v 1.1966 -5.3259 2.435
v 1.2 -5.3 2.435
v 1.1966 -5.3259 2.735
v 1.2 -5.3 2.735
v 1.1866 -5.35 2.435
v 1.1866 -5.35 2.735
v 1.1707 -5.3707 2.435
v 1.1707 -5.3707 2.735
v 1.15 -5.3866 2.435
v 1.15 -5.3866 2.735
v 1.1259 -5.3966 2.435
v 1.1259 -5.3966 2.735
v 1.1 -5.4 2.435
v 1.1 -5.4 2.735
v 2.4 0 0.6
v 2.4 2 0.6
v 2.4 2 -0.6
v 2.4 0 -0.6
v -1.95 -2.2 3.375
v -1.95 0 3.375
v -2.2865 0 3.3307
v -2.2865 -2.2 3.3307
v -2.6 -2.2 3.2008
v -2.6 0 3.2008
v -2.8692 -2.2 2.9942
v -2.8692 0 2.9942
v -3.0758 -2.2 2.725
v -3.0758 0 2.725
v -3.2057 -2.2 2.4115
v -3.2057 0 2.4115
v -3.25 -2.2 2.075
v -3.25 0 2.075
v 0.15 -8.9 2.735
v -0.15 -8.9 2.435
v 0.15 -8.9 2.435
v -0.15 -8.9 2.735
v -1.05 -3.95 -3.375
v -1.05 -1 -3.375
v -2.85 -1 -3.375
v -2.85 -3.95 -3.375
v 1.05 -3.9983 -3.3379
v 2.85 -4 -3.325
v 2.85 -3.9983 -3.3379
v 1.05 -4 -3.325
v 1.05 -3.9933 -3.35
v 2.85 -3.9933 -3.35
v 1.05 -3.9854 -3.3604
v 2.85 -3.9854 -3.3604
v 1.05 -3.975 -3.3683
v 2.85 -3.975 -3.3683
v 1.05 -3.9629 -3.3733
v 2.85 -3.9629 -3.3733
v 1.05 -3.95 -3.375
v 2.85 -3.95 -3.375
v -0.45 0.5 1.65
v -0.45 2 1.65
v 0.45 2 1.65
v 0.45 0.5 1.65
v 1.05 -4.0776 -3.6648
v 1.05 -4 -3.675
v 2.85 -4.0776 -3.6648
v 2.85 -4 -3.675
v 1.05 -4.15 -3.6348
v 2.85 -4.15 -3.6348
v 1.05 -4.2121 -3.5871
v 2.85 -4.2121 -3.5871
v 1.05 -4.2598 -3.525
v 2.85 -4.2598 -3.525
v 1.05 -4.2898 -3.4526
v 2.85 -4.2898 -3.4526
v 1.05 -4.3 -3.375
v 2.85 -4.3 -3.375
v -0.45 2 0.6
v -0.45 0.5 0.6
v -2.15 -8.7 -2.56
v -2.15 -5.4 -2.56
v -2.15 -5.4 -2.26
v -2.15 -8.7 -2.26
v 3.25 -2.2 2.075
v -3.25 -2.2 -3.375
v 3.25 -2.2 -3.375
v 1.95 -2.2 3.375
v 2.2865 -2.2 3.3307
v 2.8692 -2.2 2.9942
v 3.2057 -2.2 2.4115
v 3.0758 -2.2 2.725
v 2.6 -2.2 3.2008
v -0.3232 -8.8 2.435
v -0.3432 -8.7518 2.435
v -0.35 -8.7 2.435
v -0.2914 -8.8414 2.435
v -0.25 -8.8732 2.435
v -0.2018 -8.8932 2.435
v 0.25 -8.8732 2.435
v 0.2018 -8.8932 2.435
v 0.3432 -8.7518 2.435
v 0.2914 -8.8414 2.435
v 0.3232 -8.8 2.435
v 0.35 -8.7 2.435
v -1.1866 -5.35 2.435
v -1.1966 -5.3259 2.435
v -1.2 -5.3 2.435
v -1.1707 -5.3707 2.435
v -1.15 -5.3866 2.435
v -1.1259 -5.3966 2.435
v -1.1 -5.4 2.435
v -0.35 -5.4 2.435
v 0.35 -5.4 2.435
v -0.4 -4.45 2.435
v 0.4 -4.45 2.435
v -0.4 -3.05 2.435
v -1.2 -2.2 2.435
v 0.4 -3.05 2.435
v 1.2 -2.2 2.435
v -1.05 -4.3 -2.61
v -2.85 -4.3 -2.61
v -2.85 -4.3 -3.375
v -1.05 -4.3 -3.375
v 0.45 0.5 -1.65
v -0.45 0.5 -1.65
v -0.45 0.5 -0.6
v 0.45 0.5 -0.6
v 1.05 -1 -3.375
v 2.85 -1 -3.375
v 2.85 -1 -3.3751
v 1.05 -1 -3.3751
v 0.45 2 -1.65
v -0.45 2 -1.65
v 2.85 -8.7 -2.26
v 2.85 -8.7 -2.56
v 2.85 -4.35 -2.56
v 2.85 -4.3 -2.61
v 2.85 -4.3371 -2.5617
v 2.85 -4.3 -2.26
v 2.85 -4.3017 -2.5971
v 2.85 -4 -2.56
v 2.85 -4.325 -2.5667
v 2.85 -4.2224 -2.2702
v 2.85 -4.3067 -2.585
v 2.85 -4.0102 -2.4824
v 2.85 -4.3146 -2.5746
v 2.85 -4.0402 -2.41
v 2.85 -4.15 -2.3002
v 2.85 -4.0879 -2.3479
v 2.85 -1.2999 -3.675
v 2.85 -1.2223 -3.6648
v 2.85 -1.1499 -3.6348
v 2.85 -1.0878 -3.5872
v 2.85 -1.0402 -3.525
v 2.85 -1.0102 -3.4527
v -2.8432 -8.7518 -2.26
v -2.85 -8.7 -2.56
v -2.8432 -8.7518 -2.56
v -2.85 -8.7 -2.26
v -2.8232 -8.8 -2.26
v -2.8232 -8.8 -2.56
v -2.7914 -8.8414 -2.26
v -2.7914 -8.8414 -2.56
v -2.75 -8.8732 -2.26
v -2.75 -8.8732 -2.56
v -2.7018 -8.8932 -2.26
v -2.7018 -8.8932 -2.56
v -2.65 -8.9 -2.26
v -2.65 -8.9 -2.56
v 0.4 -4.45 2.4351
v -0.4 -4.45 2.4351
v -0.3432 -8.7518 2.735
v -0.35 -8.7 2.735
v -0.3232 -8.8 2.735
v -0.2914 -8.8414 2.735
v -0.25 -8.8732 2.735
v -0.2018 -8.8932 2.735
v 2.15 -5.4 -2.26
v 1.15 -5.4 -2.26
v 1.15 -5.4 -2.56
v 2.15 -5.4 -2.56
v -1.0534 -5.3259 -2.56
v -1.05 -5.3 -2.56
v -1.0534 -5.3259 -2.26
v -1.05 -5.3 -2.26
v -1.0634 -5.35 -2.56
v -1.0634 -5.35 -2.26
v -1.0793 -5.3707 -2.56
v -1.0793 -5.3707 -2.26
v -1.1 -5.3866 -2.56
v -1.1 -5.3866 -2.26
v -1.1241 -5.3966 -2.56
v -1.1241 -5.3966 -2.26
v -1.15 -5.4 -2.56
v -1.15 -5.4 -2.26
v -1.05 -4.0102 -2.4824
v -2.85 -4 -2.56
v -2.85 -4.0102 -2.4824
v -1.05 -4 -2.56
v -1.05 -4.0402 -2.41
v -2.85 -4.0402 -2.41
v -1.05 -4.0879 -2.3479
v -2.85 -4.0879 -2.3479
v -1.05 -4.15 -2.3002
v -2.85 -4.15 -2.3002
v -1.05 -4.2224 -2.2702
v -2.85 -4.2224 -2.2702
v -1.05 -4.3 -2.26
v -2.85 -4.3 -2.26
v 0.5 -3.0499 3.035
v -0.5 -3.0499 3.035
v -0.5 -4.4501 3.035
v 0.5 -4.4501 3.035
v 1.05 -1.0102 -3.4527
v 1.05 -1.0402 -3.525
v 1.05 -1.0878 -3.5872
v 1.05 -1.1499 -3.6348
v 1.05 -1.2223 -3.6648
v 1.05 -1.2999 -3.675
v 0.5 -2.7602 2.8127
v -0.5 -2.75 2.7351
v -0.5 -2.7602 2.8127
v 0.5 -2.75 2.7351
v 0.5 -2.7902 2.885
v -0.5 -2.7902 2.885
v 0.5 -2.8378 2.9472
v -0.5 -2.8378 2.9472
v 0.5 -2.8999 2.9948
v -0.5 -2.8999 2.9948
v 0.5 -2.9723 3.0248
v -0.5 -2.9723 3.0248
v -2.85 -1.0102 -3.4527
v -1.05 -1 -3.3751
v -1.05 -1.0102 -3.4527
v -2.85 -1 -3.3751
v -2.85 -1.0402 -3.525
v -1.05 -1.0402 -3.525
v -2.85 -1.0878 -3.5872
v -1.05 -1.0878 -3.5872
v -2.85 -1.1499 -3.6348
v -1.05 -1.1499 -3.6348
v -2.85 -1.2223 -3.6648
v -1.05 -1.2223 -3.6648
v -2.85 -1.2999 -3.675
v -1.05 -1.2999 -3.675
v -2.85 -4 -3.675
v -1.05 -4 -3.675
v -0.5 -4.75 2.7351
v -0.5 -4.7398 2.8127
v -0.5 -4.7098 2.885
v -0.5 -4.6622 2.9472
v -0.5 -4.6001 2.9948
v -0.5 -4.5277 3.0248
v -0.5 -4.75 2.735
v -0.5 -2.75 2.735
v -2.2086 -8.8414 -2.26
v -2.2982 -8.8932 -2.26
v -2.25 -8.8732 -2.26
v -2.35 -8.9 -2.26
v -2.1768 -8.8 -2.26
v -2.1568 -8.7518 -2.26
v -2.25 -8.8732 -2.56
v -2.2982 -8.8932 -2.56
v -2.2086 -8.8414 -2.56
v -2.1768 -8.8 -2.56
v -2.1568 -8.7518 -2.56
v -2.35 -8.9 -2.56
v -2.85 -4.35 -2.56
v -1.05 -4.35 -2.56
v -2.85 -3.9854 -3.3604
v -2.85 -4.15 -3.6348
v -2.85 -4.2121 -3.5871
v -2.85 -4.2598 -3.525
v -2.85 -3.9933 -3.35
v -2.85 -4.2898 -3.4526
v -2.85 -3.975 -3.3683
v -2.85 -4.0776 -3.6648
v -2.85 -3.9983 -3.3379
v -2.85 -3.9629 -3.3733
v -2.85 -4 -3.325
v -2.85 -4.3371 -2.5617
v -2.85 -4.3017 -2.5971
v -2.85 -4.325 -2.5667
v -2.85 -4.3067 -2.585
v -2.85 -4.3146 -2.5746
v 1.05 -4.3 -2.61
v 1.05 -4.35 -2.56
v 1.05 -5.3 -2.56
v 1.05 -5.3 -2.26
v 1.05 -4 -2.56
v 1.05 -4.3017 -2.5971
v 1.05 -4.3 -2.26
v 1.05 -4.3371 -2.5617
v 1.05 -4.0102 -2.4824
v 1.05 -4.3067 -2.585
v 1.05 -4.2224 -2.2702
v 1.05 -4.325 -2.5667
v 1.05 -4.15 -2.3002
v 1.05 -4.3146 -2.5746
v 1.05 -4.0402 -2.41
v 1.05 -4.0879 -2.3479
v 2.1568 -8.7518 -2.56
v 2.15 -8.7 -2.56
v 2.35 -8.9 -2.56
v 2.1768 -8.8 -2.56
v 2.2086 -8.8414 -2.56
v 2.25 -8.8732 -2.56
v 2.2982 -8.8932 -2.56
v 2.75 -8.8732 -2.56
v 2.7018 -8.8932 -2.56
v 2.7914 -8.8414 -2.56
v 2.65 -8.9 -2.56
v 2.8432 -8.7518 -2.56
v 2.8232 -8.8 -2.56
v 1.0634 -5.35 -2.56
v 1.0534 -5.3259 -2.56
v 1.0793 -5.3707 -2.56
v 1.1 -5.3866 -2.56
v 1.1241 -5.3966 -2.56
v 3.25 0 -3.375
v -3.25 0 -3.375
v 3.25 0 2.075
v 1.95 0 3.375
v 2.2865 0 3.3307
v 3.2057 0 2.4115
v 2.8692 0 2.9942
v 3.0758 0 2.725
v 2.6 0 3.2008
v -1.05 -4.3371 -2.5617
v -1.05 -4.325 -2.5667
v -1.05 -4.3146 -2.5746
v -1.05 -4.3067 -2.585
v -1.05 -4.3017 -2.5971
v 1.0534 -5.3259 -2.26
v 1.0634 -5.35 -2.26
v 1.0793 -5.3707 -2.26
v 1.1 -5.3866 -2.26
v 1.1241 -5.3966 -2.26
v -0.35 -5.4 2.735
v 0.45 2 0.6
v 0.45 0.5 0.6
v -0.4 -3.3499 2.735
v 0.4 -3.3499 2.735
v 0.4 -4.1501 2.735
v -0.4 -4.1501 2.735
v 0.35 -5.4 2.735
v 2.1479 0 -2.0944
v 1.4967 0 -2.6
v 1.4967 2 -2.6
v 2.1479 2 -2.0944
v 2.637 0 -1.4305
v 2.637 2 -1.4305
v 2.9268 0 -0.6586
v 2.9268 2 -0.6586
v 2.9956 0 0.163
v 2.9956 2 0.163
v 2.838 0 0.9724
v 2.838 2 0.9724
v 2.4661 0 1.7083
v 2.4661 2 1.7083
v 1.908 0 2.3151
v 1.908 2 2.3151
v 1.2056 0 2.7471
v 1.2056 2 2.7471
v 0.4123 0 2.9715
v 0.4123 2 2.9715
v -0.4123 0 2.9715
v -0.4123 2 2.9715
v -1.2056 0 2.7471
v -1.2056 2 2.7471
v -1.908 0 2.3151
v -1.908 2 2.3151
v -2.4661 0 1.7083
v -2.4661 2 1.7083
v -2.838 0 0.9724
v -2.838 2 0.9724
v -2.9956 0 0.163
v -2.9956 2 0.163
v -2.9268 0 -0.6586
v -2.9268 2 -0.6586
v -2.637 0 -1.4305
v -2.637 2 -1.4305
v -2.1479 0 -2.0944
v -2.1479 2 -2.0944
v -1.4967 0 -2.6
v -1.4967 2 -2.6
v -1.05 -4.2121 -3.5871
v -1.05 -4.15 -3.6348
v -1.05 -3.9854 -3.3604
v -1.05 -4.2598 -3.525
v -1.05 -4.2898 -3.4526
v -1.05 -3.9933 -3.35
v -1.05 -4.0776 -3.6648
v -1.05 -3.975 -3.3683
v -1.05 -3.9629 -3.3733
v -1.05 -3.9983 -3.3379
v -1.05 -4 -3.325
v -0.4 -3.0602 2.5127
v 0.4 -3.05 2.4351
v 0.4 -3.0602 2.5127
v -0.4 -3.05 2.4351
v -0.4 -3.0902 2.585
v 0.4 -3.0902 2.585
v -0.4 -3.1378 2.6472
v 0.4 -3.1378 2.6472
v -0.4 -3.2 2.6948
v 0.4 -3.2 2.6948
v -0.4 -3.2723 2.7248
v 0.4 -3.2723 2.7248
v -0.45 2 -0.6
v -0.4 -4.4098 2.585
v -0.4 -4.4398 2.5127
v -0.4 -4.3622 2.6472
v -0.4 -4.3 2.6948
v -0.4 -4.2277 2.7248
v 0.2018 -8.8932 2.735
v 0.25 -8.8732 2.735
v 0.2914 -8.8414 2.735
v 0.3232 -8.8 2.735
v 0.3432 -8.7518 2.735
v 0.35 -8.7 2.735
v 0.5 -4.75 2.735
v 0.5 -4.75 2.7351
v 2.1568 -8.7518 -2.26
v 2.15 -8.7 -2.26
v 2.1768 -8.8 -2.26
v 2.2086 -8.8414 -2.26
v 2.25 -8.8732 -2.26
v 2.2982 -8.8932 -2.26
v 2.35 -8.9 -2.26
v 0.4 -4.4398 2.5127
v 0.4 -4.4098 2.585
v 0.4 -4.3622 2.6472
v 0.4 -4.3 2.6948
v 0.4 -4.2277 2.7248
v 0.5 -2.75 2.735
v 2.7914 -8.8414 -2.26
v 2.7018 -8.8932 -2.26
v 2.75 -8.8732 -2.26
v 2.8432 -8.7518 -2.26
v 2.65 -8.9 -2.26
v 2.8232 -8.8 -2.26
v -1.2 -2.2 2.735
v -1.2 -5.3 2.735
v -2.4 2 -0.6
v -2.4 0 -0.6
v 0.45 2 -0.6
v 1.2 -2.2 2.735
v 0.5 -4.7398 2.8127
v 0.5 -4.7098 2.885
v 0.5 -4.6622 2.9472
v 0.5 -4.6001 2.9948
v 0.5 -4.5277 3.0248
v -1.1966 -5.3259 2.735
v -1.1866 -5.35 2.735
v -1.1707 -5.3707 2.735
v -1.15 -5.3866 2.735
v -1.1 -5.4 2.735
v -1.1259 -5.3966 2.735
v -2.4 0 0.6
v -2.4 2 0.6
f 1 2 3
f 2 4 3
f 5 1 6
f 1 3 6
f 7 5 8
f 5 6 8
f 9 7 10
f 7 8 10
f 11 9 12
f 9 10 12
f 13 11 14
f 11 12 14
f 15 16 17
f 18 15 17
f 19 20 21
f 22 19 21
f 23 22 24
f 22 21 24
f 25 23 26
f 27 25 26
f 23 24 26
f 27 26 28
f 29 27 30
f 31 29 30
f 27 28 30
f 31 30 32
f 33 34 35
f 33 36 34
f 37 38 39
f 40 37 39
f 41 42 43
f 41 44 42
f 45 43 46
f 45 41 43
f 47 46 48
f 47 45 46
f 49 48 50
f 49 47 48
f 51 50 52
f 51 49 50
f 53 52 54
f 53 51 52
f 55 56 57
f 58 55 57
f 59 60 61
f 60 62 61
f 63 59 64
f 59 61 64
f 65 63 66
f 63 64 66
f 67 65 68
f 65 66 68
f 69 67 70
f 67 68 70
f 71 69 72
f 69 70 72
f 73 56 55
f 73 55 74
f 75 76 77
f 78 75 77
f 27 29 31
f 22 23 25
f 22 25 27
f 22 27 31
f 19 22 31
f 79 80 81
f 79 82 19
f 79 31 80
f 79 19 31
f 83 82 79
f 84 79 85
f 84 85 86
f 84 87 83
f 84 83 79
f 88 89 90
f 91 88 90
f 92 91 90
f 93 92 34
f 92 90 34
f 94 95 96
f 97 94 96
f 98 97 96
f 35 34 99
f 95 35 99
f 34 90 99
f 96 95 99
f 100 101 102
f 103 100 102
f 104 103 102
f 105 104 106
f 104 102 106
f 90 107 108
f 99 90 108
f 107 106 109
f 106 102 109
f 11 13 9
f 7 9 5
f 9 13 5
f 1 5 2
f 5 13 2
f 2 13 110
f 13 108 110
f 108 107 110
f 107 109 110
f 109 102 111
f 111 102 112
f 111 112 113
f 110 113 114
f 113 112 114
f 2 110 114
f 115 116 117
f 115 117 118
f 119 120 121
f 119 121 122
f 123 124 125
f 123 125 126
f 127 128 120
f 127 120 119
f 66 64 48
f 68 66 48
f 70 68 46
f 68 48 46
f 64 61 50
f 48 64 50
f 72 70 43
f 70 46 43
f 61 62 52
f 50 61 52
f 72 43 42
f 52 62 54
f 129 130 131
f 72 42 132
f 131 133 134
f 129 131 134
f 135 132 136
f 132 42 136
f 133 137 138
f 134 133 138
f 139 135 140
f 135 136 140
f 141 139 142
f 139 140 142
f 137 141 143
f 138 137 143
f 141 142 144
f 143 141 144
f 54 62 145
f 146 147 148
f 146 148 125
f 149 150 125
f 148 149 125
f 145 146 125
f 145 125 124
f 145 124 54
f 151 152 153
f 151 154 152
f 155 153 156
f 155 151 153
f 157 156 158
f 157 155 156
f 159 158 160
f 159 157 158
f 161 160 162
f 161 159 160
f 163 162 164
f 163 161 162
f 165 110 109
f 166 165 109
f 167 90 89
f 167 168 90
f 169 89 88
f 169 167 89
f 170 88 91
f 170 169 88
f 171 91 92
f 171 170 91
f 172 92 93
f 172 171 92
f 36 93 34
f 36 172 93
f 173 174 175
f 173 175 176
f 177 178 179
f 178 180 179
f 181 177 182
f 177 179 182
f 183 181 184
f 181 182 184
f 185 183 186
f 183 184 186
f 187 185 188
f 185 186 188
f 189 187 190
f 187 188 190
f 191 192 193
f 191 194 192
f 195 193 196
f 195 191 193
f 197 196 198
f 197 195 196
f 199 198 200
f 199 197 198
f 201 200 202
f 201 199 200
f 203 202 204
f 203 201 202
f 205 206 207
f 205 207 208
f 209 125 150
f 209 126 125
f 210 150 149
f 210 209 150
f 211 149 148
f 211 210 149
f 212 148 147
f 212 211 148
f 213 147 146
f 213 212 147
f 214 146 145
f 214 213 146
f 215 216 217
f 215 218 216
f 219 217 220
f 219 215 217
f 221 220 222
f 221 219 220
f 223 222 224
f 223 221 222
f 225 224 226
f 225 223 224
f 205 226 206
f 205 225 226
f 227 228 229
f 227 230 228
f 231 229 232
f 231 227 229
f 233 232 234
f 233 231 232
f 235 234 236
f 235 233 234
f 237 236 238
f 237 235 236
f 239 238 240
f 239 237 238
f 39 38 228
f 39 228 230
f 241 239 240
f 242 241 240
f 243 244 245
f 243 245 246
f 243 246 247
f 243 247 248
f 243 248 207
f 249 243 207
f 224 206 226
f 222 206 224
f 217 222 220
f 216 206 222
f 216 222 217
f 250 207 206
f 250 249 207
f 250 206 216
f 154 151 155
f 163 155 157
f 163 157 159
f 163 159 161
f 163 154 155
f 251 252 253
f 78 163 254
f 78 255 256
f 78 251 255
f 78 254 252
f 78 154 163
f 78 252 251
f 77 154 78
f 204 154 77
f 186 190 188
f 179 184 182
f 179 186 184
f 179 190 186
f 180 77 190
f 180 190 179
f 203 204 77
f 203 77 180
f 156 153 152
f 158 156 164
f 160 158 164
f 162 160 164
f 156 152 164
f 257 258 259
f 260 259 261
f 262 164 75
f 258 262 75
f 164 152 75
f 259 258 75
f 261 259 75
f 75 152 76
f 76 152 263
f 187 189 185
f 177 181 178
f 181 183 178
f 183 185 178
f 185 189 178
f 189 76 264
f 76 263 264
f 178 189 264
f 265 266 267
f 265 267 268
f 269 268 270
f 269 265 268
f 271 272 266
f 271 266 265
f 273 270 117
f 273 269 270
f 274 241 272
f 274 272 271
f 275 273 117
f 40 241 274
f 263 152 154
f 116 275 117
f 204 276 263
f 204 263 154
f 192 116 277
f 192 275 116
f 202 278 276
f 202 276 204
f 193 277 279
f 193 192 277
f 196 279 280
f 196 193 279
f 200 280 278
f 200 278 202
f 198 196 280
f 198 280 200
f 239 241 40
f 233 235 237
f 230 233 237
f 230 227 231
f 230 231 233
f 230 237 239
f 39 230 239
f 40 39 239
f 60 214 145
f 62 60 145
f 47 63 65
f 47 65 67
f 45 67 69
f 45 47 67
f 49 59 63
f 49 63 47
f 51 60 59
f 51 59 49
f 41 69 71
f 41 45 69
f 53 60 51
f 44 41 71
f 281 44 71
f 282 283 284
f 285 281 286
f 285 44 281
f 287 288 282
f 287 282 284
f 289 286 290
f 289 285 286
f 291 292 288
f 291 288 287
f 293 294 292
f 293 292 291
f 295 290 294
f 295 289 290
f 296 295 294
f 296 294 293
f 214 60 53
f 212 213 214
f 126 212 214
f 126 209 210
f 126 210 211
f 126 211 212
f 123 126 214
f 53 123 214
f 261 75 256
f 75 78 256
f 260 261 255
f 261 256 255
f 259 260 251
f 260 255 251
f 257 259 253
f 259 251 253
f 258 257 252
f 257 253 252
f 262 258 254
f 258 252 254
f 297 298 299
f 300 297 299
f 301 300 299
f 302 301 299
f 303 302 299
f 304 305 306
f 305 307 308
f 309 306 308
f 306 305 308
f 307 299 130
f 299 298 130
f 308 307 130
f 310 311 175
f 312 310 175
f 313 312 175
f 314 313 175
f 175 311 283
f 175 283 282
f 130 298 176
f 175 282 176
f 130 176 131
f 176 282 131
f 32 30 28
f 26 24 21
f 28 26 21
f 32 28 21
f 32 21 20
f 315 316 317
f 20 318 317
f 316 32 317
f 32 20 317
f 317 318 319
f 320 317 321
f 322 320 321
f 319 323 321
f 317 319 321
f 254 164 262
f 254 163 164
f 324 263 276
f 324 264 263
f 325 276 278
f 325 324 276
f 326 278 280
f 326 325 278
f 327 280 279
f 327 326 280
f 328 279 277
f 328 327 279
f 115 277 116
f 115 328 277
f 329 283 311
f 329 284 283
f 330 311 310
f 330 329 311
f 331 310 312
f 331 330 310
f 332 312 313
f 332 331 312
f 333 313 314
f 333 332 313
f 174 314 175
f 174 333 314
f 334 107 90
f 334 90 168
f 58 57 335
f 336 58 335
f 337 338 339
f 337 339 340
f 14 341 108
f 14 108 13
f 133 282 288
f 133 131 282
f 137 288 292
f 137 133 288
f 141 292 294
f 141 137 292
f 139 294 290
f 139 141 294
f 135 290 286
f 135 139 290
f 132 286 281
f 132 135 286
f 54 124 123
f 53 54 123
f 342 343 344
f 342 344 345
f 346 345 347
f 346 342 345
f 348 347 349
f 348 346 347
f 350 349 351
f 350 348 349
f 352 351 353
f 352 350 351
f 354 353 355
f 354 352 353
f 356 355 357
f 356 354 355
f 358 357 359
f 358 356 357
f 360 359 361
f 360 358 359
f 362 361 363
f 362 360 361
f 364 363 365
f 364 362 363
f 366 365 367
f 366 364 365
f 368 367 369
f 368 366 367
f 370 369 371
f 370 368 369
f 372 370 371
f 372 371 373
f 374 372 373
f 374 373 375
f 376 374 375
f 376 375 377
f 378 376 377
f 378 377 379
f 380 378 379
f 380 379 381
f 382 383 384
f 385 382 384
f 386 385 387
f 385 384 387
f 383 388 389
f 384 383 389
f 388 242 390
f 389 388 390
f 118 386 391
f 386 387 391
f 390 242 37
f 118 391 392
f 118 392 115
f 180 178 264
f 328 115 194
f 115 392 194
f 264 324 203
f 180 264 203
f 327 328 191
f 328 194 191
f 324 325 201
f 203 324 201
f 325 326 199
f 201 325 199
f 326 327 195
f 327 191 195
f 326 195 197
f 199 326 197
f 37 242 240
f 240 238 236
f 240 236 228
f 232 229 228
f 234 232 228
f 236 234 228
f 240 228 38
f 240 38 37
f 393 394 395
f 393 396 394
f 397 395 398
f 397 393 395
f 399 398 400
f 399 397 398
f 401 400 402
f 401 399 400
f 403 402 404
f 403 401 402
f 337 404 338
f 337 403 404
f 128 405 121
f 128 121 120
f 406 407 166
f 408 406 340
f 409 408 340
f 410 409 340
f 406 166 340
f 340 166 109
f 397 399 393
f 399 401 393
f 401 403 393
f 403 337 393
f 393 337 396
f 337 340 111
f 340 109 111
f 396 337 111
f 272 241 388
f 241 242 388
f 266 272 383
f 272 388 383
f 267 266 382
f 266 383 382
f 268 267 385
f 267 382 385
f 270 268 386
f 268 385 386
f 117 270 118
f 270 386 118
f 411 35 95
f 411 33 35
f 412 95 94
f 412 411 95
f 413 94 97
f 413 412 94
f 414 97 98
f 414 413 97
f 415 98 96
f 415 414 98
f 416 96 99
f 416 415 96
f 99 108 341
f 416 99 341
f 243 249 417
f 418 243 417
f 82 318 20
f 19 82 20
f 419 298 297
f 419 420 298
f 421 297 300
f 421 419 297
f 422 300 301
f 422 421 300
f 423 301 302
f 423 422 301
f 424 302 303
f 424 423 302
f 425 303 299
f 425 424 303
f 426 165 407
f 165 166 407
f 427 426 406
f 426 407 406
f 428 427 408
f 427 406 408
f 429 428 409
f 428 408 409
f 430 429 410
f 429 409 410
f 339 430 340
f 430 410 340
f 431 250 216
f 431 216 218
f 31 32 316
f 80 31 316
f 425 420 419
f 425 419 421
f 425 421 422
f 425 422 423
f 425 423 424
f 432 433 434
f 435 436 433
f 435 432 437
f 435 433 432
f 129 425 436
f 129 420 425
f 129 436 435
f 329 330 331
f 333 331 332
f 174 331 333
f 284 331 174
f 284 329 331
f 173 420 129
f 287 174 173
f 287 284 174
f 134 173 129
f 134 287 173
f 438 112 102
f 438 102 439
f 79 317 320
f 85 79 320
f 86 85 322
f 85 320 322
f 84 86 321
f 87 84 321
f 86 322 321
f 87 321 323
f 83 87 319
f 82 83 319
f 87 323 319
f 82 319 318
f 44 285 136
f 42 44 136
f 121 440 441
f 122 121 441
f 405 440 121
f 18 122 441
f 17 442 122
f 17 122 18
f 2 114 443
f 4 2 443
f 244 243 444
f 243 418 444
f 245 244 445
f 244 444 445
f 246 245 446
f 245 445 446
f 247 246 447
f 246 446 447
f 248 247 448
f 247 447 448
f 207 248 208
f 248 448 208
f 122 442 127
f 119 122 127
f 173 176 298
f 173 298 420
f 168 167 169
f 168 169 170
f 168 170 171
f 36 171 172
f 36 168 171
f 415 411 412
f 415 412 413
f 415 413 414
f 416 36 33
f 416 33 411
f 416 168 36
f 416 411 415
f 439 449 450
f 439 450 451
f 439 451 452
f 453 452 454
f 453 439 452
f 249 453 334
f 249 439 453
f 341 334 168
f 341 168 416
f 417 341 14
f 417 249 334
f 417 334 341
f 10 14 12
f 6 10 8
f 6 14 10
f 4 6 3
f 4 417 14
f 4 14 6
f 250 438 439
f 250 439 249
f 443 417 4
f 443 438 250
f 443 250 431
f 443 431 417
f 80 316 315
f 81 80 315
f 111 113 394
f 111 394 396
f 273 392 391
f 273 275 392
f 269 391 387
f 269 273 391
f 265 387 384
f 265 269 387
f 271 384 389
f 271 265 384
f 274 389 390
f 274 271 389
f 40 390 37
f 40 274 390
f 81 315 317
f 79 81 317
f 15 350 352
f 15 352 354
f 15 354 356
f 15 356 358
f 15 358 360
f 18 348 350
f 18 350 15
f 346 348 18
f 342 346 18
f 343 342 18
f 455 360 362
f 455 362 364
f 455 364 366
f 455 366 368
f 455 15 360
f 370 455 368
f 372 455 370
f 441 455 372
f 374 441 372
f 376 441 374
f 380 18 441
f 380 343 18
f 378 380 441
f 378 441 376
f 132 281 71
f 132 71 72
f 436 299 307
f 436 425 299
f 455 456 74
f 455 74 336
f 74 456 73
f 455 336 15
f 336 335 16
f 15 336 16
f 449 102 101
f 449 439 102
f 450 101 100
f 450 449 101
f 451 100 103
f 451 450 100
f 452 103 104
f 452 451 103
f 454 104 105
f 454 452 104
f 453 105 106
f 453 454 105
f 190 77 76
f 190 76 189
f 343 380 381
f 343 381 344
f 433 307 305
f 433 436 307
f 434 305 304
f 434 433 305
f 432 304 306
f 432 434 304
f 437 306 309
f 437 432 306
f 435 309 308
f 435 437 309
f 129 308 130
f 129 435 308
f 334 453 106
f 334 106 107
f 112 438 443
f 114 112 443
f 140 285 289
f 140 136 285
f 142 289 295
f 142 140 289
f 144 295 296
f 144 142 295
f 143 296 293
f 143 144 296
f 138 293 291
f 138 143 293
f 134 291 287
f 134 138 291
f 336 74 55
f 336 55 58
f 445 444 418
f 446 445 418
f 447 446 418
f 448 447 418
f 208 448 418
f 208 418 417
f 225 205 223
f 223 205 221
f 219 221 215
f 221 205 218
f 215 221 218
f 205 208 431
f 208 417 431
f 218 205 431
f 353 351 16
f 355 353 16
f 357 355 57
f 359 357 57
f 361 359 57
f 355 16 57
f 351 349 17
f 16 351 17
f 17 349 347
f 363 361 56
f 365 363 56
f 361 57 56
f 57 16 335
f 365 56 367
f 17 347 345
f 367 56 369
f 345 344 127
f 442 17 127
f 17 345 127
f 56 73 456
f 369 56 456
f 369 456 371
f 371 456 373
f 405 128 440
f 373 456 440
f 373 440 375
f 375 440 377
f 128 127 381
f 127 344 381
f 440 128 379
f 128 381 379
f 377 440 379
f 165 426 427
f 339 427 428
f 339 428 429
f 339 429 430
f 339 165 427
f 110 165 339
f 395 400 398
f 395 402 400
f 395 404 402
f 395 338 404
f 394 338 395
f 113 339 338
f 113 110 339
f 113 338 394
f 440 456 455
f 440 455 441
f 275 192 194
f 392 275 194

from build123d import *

# Parameters (mm, degrees)
BOSS_EXTRUDE1_DEPTH   = 2
SKETCH2_W             = 4.8
SKETCH2_H             = 1.2
CUT_EXTRUDE1_DEPTH    = 5.69041576
SKETCH3_W             = 0.9
SKETCH3_H             = 3.3
CUT_EXTRUDE2_DEPTH    = 1.5
BOSS_EXTRUDE2_DEPTH   = 2.2
SKETCH5_W             = 2.4
SKETCH5_H             = 0.3
BOSS_EXTRUDE3_DEPTH   = 3.2
SKETCH6_W             = 0.7
SKETCH6_H             = 0.3
BOSS_EXTRUDE4_DEPTH   = 3.5
FILLET1_R             = 0.1
FILLET2_R             = 0.2
SKETCH8_W             = 1
SKETCH8_H             = 2
BOSS_EXTRUDE5_DEPTH   = 0.3
FILLET3_R             = 0.3
SKETCH16_W            = 0.8
SKETCH16_H            = 1.4
CUT_EXTRUDE5_DEPTH    = 0.3
FILLET18_R            = 0.3
SKETCH9_W             = 1.8
SKETCH9_H             = 3
BOSS_EXTRUDE6_DEPTH   = 0.3
BOSS_EXTRUDE6_2_DEPTH = 0.3
FILLET4_R             = 0.3
FILLET5_R             = 0.3
SKETCH10_W            = 1.8
SKETCH10_H            = 1.415
BOSS_EXTRUDE7_DEPTH   = 0.3
FILLET6_R             = 0.3
FILLET7_R             = 0.3
FILLET8_R             = 0.05
FILLET9_R             = 0.05
SKETCH11_W            = 1.8
SKETCH11_H            = 0.3
BOSS_EXTRUDE8_DEPTH   = 1.1
FILLET10_R            = 0.3
FILLET11_R            = 0.3
FILLET12_R            = 0.05
FILLET13_R            = 0.05
SKETCH13_W            = 0.7
SKETCH13_H            = 0.3
BOSS_EXTRUDE9_DEPTH   = 3.5
FILLET14_R            = 0.2
SKETCH15_W            = 0.7
SKETCH15_H            = 0.3
BOSS_EXTRUDE10_DEPTH  = 3.5
FILLET15_R            = 0.2
FILLET16_R            = 0.1
FILLET17_R            = 0.1


with BuildPart() as part:
    # Sketch1 → Boss-Extrude1 (new body)
    with BuildSketch(Plane(origin=(0, 0, 0), x_dir=(1, 0, 0), z_dir=(0, 1, 0))):
        with BuildLine():
            Line((-1.496662955, 2.6), (1.496662955, 2.6))
            ThreePointArc((1.496662955, 2.6), (0, -3), (-1.496662955, 2.6))
        make_face()
    extrude(amount=BOSS_EXTRUDE1_DEPTH)

    # Sketch2 → Cut-Extrude1 (cut, through all)
    with BuildSketch(Plane(origin=(0, 2, 0), x_dir=(1, 0, 0), z_dir=(0, 1, 0))):
        Rectangle(SKETCH2_W, SKETCH2_H)
    extrude(amount=-CUT_EXTRUDE1_DEPTH, mode=Mode.SUBTRACT)

    # Sketch3 → Cut-Extrude2 (cut)
    with BuildSketch(Plane(origin=(0, 2, 0), x_dir=(1, 0, 0), z_dir=(0, 1, 0))):
        Rectangle(SKETCH3_W, SKETCH3_H)
    extrude(amount=-CUT_EXTRUDE2_DEPTH, mode=Mode.SUBTRACT)


with BuildPart() as body_2:
    # Sketch4 → Boss-Extrude2 (new body)
    with BuildSketch(Plane.XZ):
        with BuildLine():
            Line((-3.25, -3.375), (3.25, -3.375))
            Line((3.25, -3.375), (3.25, 2.075))
            ThreePointArc((3.25, 2.075), (2.869238816, 2.994238816), (1.95, 3.375))
            Line((1.95, 3.375), (-1.95, 3.375))
            ThreePointArc((-1.95, 3.375), (-2.869238816, 2.994238816), (-3.25, 2.075))
            Line((-3.25, 2.075), (-3.25, -3.375))
        make_face()
    extrude(amount=BOSS_EXTRUDE2_DEPTH)


with BuildPart() as body_3:
    # Sketch5 → Boss-Extrude3 (new body)
    with BuildSketch(Plane.XZ.offset(2.2)):
        with Locations((0, 2.585)):
            Rectangle(SKETCH5_W, SKETCH5_H)
    extrude(amount=BOSS_EXTRUDE3_DEPTH)

    # Sketch6 → Boss-Extrude4 (add)
    with BuildSketch(Plane.XZ.offset(5.4)):
        with Locations((0, 2.585)):
            Rectangle(SKETCH6_W, SKETCH6_H)
    extrude(amount=BOSS_EXTRUDE4_DEPTH)

    # Fillet1
    fillet1_edges = [body_3.edges().sort_by_distance(p)[0] for p in [
        (-1.2, -5.4, 2.585),
        (1.2, -5.4, 2.585),
    ]]
    fillet(fillet1_edges, radius=FILLET1_R)

    # Fillet2
    fillet2_edges = [body_3.edges().sort_by_distance(p)[0] for p in [
        (0.35, -8.9, 2.585),
        (-0.35, -8.9, 2.585),
    ]]
    fillet(fillet2_edges, radius=FILLET2_R)

    # Sketch8 → Boss-Extrude5 (add)
    with BuildSketch(Plane.XY.offset(2.735)):
        with Locations((0, -3.75)):
            Rectangle(SKETCH8_W, SKETCH8_H)
    extrude(amount=BOSS_EXTRUDE5_DEPTH)

    # Fillet3
    fillet3_edges = [body_3.edges().sort_by_distance(p)[0] for p in [
        (0, -4.75, 3.035),
        (0, -2.75, 3.035),
    ]]
    fillet(fillet3_edges, radius=FILLET3_R - 0.0001)  # a hair under: the kernel refuses the full size

    # Sketch16 → Cut-Extrude5 (cut)
    with BuildSketch(Plane(origin=(0, 0, 2.435), x_dir=(-1, 0, 0), z_dir=(0, 0, -1))):
        with Locations((0, -3.75)):
            Rectangle(SKETCH16_W, SKETCH16_H)
    extrude(amount=-CUT_EXTRUDE5_DEPTH, mode=Mode.SUBTRACT)

    # Fillet18
    fillet18_edges = [body_3.edges().sort_by_distance(p)[0] for p in [
        (0, -3.05, 2.735),
        (0, -4.45, 2.735),
    ]]
    fillet(fillet18_edges, radius=FILLET18_R - 0.0001)  # a hair under: the kernel refuses the full size


with BuildPart() as body_4:
    # Sketch9 → Boss-Extrude6 (new body)
    with BuildSketch(Plane(origin=(0, 0, -3.375), x_dir=(-1, 0, 0), z_dir=(0, 0, -1))):
        with Locations((-1.95, -2.5)):
            Rectangle(SKETCH9_W, SKETCH9_H)
    extrude(amount=BOSS_EXTRUDE6_DEPTH)

    # Fillet4
    fillet4_edges = [body_4.edges().sort_by_distance(p)[0] for p in [
        (1.95, -1, -3.675),
    ]]
    fillet(fillet4_edges, radius=FILLET4_R - 0.0001)  # a hair under: the kernel refuses the full size



with BuildPart() as body_5:
    # Sketch9 → Boss-Extrude6 2 (new body)
    with BuildSketch(Plane(origin=(0, 0, -3.375), x_dir=(-1, 0, 0), z_dir=(0, 0, -1))):
        with Locations((1.95, -2.5)):
            Rectangle(SKETCH9_W, SKETCH9_H)
    extrude(amount=BOSS_EXTRUDE6_2_DEPTH)

    # Fillet5
    fillet5_edges = [body_5.edges().sort_by_distance(p)[0] for p in [
        (-1.95, -1, -3.675),
    ]]
    fillet(fillet5_edges, radius=FILLET5_R - 0.0001)  # a hair under: the kernel refuses the full size


with BuildPart() as body_4_1:
    add(body_4.part)

    add(body_5.part)  # Boss-Extrude7 merges body 5
    # Sketch10 → Boss-Extrude7 (add)
    with BuildSketch(Plane.XZ.offset(4)):
        with Locations((-1.95, -2.9675)):
            Rectangle(SKETCH10_W, SKETCH10_H)
        with Locations((1.95, -2.9675)):
            Rectangle(SKETCH10_W, SKETCH10_H)
    extrude(amount=BOSS_EXTRUDE7_DEPTH)

    # Fillet6
    fillet6_edges = [body_4_1.edges().sort_by_distance(p)[0] for p in [
        (-1.95, -4.3, -3.675),
    ]]
    fillet(fillet6_edges, radius=FILLET6_R)

    # Fillet7
    fillet7_edges = [body_4_1.edges().sort_by_distance(p)[0] for p in [
        (1.95, -4.3, -3.675),
    ]]
    fillet(fillet7_edges, radius=FILLET7_R)

    # Fillet8
    fillet8_edges = [body_4_1.edges().sort_by_distance(p)[0] for p in [
        (1.95, -4, -3.375),
    ]]
    fillet(fillet8_edges, radius=FILLET8_R)

    # Fillet9
    fillet9_edges = [body_4_1.edges().sort_by_distance(p)[0] for p in [
        (-1.95, -4, -3.375),
    ]]
    fillet(fillet9_edges, radius=FILLET9_R)

    # Sketch11 → Boss-Extrude8 (add)
    with BuildSketch(Plane.XZ.offset(4.3)):
        with Locations((-1.95, -2.41)):
            Rectangle(SKETCH11_W, SKETCH11_H)
        with Locations((1.95, -2.41)):
            Rectangle(SKETCH11_W, SKETCH11_H)
    extrude(amount=BOSS_EXTRUDE8_DEPTH)

    # Fillet10
    fillet10_edges = [body_4_1.edges().sort_by_distance(p)[0] for p in [
        (-1.95, -4, -2.26),
    ]]
    fillet(fillet10_edges, radius=FILLET10_R)

    # Fillet11
    fillet11_edges = [body_4_1.edges().sort_by_distance(p)[0] for p in [
        (1.95, -4, -2.26),
    ]]
    fillet(fillet11_edges, radius=FILLET11_R)

    # Fillet12
    fillet12_edges = [body_4_1.edges().sort_by_distance(p)[0] for p in [
        (1.95, -4.3, -2.56),
    ]]
    fillet(fillet12_edges, radius=FILLET12_R)

    # Fillet13
    fillet13_edges = [body_4_1.edges().sort_by_distance(p)[0] for p in [
        (-1.95, -4.3, -2.56),
    ]]
    fillet(fillet13_edges, radius=FILLET13_R)

    # Sketch13 → Boss-Extrude9 (add)
    with BuildSketch(Plane(origin=(2.120815784, -5.4, -5.846545424), x_dir=(1, 0, 0), z_dir=(0, -1, 0))):
        with Locations((0.379184216, 3.436545424)):
            Rectangle(SKETCH13_W, SKETCH13_H)
    extrude(amount=BOSS_EXTRUDE9_DEPTH)

    # Fillet14
    fillet14_edges = [body_4_1.edges().sort_by_distance(p)[0] for p in [
        (2.85, -8.9, -2.41),
        (2.15, -8.9, -2.41),
    ]]
    fillet(fillet14_edges, radius=FILLET14_R)

    # Sketch15 → Boss-Extrude10 (add)
    with BuildSketch(Plane(origin=(-2.261414386, -5.4, -5.820113932), x_dir=(1, 0, 0), z_dir=(0, -1, 0))):
        with Locations((-0.238585614, 3.410113932)):
            Rectangle(SKETCH15_W, SKETCH15_H)
    extrude(amount=BOSS_EXTRUDE10_DEPTH)

    # Fillet15
    fillet15_edges = [body_4_1.edges().sort_by_distance(p)[0] for p in [
        (-2.15, -8.9, -2.41),
        (-2.85, -8.9, -2.41),
    ]]
    fillet(fillet15_edges, radius=FILLET15_R)

    # Fillet16
    fillet16_edges = [body_4_1.edges().sort_by_distance(p)[0] for p in [
        (1.05, -5.4, -2.41),
    ]]
    fillet(fillet16_edges, radius=FILLET16_R)

    # Fillet17
    fillet17_edges = [body_4_1.edges().sort_by_distance(p)[0] for p in [
        (-1.05, -5.4, -2.41),
    ]]
    fillet(fillet17_edges, radius=FILLET17_R)


solid = Compound([part.part, body_2.part, body_3.part, body_4_1.part])
